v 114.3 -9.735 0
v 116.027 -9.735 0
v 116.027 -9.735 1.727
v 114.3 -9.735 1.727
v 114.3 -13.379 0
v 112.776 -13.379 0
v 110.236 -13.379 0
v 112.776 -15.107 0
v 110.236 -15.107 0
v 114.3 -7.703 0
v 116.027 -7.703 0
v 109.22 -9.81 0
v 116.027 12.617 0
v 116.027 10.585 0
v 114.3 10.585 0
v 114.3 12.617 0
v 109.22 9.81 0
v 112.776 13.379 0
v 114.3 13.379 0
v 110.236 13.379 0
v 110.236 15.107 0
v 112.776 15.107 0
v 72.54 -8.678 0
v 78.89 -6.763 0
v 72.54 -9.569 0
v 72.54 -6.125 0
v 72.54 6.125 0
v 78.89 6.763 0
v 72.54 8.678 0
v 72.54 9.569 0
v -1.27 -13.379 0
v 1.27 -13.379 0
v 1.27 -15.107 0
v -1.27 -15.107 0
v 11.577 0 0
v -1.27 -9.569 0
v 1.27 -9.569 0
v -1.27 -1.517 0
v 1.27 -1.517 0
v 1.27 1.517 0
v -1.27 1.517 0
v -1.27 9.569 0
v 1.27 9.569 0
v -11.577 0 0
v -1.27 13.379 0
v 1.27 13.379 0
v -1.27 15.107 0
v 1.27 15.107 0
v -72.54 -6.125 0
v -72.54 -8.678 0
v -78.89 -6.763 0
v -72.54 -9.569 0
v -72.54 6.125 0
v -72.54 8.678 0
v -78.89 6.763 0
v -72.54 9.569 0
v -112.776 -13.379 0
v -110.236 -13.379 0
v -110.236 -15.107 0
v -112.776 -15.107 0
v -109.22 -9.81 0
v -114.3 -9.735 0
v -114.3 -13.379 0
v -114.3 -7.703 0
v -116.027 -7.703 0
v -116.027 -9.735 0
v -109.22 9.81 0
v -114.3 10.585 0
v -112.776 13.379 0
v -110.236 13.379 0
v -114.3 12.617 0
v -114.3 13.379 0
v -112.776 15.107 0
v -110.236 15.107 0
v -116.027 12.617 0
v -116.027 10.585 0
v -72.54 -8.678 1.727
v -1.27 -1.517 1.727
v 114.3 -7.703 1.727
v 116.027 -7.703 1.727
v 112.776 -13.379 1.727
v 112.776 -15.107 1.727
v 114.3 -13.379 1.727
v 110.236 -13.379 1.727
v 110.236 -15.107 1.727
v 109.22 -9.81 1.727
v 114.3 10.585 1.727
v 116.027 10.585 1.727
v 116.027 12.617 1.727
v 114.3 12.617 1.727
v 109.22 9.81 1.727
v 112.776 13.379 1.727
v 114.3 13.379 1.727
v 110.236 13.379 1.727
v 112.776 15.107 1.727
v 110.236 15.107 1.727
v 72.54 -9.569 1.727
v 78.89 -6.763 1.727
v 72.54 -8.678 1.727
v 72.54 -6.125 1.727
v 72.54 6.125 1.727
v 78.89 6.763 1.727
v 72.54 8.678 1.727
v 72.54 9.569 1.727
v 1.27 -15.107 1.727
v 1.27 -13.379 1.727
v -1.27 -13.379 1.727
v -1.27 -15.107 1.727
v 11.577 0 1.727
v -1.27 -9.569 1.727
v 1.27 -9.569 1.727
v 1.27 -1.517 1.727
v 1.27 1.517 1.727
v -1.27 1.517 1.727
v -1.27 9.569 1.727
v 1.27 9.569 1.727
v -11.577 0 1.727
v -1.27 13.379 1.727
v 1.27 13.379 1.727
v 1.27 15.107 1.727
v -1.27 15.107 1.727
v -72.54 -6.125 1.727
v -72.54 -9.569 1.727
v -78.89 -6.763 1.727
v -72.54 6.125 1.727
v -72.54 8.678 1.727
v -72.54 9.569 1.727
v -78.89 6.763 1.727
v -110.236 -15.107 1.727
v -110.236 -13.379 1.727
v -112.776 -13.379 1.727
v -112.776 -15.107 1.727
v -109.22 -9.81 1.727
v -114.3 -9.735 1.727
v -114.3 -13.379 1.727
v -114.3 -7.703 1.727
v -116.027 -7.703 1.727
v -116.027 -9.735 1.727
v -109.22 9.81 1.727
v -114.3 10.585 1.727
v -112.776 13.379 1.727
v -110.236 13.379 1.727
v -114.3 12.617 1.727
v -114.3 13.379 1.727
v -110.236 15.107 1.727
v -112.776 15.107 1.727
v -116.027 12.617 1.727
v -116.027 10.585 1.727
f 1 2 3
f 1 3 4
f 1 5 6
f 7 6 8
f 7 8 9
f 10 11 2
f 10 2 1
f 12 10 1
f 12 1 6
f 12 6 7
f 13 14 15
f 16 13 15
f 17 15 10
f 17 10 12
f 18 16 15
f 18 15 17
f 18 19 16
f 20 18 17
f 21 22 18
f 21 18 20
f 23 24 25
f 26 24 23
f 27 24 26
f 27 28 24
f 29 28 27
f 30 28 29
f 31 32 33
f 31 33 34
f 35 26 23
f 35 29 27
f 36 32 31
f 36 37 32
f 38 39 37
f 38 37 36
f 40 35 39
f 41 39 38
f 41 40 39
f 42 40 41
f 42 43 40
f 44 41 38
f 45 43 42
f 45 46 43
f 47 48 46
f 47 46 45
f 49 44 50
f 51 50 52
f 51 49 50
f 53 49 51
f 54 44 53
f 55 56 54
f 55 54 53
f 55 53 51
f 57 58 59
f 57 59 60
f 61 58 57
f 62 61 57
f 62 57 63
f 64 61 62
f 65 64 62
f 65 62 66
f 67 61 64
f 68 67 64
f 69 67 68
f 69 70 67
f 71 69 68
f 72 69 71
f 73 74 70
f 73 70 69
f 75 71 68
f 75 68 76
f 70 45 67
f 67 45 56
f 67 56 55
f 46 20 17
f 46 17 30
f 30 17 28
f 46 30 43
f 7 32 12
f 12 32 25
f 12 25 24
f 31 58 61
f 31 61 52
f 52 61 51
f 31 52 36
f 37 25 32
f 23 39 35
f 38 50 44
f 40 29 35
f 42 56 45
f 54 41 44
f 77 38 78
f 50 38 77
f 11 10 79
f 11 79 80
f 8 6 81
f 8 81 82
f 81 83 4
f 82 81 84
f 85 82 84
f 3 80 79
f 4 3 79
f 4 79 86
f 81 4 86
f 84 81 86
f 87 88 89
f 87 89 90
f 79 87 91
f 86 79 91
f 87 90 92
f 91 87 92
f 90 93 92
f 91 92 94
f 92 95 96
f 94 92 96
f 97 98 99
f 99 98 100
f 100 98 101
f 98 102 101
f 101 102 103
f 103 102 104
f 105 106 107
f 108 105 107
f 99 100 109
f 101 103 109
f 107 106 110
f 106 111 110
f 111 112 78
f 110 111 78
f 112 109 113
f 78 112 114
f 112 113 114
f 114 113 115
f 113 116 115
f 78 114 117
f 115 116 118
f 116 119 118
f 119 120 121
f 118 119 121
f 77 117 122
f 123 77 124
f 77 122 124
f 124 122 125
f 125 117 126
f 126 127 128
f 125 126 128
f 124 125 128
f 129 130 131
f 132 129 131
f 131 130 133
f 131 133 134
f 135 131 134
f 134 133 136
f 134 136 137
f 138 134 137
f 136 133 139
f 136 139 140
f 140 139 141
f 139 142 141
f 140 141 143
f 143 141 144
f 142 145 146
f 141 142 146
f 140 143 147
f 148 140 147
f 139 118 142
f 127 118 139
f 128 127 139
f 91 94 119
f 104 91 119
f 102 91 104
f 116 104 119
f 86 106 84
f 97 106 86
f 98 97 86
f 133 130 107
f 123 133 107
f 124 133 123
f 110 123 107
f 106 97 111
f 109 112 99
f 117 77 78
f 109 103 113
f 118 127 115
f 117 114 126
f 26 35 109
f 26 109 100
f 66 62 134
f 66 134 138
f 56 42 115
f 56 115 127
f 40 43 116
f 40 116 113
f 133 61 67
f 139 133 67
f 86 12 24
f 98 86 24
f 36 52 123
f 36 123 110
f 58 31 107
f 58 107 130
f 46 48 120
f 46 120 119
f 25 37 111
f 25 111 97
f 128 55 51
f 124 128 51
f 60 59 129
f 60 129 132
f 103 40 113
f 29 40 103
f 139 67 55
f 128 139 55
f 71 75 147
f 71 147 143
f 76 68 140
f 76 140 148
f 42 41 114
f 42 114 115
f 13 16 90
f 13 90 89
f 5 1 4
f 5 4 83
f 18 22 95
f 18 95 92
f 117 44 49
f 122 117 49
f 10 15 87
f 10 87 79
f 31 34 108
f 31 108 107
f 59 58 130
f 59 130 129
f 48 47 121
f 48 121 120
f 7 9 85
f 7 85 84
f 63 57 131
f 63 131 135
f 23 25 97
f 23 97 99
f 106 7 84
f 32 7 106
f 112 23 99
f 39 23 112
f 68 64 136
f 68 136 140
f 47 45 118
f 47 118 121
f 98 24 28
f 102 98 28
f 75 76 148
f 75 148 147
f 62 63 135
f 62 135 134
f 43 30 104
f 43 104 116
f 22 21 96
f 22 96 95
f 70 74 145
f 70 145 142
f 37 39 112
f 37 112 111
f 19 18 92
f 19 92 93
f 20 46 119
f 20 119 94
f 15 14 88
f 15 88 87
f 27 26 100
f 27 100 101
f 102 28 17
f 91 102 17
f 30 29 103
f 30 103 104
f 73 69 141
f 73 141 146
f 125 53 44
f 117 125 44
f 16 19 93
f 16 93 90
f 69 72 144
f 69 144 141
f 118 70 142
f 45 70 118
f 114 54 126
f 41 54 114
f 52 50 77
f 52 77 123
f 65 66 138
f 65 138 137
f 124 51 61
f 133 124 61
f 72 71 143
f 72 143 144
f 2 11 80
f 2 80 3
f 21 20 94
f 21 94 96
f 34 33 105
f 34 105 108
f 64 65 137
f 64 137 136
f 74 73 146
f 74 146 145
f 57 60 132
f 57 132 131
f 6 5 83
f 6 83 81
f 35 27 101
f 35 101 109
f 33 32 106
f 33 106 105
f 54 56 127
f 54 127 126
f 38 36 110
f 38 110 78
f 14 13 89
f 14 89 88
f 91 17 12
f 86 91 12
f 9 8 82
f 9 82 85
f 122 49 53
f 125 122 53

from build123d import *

# Parameters (mm, degrees)
BOSS_EXTRUDE1_DEPTH = 1.7272


with BuildPart() as part:
    # Sketch1 → Boss-Extrude1 (new body)
    with BuildSketch(Plane.XY):
        Polygon((-114.3, 13.37945), (-112.776, 13.37945), (-112.776, 15.10665), (-110.236, 15.10665), (-110.236, 13.37945), (-1.27, 13.37945), (-1.27, 15.10665), (1.27, 15.10665), (1.27, 13.37945), (110.236, 13.37945), (110.236, 15.10665), (112.776, 15.10665), (112.776, 13.37945), (114.3, 13.37945), (114.3, 12.61745), (116.0272, 12.61745), (116.0272, 10.58545), (114.3, 10.58545), (114.3, -7.70255), (116.0272, -7.70255), (116.0272, -9.73455), (114.3, -9.73455), (114.3, -13.37945), (112.776, -13.37945), (112.776, -15.10665), (110.236, -15.10665), (110.236, -13.37945), (1.27, -13.37945), (1.27, -15.10665), (-1.27, -15.10665), (-1.27, -13.37945), (-110.236, -13.37945), (-110.236, -15.10665), (-112.776, -15.10665), (-112.776, -13.37945), (-114.3, -13.37945), (-114.3, -9.73455), (-116.0272, -9.73455), (-116.0272, -7.70255), (-114.3, -7.70255), (-114.3, 10.58545), (-116.0272, 10.58545), (-116.0272, 12.61745), (-114.3, 12.61745), align=None)
        Polygon((-1.27, -1.517324769), (-72.54, -8.677584102), (-72.54, -9.56945), (-1.27, -9.56945), align=None, mode=Mode.SUBTRACT)
        Polygon((-78.89, -6.76276081), (-109.22, -9.80991481), (-109.22, 9.80991481), (-78.89, 6.76276081), align=None, mode=Mode.SUBTRACT)
        Polygon((-11.576521468, 0), (-72.54, -6.124797477), (-72.54, 6.124797477), align=None, mode=Mode.SUBTRACT)
        Polygon((-1.27, 9.56945), (-72.54, 9.56945), (-72.54, 8.677584102), (-1.27, 1.517324769), align=None, mode=Mode.SUBTRACT)
        Polygon((1.27, 1.517324769), (72.54, 8.677584102), (72.54, 9.56945), (1.27, 9.56945), align=None, mode=Mode.SUBTRACT)
        Polygon((78.89, 6.76276081), (109.22, 9.80991481), (109.22, -9.80991481), (78.89, -6.76276081), align=None, mode=Mode.SUBTRACT)
        Polygon((72.54, -6.124797477), (72.54, 6.124797477), (11.576521468, 0), align=None, mode=Mode.SUBTRACT)
        Polygon((1.27, -9.56945), (72.54, -9.56945), (72.54, -8.677584102), (1.27, -1.517324769), align=None, mode=Mode.SUBTRACT)
    extrude(amount=BOSS_EXTRUDE1_DEPTH)


solid = part.part
